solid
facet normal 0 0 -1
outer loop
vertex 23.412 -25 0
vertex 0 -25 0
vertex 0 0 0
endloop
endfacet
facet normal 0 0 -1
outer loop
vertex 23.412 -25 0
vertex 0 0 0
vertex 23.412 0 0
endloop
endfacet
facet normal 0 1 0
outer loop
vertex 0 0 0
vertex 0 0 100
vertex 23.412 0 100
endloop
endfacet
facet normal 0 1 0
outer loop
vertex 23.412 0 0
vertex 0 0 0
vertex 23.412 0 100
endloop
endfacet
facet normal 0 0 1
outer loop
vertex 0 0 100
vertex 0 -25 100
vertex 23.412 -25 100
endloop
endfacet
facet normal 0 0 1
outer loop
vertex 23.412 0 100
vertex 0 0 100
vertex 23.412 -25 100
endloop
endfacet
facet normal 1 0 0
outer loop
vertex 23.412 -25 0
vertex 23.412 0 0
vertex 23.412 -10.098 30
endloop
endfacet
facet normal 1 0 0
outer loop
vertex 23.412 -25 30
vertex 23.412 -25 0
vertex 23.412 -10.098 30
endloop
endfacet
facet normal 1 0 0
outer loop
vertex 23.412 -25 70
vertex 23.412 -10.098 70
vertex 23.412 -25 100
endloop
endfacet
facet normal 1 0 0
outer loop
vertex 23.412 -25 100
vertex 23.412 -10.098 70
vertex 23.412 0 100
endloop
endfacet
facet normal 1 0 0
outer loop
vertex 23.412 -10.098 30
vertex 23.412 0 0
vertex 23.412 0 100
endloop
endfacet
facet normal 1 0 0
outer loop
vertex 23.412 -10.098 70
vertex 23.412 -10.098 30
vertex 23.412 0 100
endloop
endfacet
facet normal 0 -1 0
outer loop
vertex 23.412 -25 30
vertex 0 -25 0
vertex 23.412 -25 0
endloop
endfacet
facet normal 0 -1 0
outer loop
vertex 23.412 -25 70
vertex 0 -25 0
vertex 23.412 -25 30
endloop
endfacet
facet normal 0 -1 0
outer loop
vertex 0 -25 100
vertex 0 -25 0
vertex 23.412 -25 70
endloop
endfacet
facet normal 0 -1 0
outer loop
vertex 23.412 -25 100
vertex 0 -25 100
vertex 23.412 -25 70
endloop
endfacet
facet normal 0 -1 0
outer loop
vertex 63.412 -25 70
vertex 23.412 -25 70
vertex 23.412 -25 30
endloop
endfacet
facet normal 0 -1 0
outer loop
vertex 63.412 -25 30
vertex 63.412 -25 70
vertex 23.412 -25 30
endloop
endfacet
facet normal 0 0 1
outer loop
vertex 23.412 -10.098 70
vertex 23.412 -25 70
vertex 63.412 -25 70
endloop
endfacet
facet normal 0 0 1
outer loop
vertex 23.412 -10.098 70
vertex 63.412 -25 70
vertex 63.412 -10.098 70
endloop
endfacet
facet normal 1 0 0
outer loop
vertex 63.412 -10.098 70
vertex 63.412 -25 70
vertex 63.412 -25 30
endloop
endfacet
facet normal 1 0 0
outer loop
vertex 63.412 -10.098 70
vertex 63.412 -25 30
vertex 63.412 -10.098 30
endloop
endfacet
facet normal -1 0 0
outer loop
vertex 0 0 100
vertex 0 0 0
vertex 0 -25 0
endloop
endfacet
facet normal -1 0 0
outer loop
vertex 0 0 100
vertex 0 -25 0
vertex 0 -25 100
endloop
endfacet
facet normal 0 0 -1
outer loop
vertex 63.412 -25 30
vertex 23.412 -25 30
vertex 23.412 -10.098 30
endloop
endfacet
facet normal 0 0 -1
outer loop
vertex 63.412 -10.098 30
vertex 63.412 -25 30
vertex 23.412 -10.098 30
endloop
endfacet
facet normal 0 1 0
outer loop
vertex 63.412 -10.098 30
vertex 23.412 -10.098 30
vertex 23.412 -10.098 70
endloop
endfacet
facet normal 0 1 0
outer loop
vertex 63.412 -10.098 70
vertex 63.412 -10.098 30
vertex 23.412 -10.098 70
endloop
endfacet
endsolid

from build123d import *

# Parameters (mm, degrees)
F0_W     = 23.412162
F0_H     = 100
F1_DEPTH = 25
F2_W     = 14.901995
F2_H     = 20
F3_DEPTH = 40


with BuildPart() as f1:
    # F0 (on Front) → F1 (new body)
    with BuildSketch(Plane.XZ):
        with Locations((11.706081, 50)):
            Rectangle(F0_W, F0_H)
    extrude(amount=F1_DEPTH)

    # F2 (on face) → F3 (join)
    with BuildSketch(Plane.YZ.offset(23.412162)):
        with Locations((-17.549003, 60)):
            Rectangle(F2_W, F2_H)
        with Locations((-17.549003, 40)):
            Rectangle(F2_W, F2_H)
    extrude(amount=F3_DEPTH)


solid = f1.part
